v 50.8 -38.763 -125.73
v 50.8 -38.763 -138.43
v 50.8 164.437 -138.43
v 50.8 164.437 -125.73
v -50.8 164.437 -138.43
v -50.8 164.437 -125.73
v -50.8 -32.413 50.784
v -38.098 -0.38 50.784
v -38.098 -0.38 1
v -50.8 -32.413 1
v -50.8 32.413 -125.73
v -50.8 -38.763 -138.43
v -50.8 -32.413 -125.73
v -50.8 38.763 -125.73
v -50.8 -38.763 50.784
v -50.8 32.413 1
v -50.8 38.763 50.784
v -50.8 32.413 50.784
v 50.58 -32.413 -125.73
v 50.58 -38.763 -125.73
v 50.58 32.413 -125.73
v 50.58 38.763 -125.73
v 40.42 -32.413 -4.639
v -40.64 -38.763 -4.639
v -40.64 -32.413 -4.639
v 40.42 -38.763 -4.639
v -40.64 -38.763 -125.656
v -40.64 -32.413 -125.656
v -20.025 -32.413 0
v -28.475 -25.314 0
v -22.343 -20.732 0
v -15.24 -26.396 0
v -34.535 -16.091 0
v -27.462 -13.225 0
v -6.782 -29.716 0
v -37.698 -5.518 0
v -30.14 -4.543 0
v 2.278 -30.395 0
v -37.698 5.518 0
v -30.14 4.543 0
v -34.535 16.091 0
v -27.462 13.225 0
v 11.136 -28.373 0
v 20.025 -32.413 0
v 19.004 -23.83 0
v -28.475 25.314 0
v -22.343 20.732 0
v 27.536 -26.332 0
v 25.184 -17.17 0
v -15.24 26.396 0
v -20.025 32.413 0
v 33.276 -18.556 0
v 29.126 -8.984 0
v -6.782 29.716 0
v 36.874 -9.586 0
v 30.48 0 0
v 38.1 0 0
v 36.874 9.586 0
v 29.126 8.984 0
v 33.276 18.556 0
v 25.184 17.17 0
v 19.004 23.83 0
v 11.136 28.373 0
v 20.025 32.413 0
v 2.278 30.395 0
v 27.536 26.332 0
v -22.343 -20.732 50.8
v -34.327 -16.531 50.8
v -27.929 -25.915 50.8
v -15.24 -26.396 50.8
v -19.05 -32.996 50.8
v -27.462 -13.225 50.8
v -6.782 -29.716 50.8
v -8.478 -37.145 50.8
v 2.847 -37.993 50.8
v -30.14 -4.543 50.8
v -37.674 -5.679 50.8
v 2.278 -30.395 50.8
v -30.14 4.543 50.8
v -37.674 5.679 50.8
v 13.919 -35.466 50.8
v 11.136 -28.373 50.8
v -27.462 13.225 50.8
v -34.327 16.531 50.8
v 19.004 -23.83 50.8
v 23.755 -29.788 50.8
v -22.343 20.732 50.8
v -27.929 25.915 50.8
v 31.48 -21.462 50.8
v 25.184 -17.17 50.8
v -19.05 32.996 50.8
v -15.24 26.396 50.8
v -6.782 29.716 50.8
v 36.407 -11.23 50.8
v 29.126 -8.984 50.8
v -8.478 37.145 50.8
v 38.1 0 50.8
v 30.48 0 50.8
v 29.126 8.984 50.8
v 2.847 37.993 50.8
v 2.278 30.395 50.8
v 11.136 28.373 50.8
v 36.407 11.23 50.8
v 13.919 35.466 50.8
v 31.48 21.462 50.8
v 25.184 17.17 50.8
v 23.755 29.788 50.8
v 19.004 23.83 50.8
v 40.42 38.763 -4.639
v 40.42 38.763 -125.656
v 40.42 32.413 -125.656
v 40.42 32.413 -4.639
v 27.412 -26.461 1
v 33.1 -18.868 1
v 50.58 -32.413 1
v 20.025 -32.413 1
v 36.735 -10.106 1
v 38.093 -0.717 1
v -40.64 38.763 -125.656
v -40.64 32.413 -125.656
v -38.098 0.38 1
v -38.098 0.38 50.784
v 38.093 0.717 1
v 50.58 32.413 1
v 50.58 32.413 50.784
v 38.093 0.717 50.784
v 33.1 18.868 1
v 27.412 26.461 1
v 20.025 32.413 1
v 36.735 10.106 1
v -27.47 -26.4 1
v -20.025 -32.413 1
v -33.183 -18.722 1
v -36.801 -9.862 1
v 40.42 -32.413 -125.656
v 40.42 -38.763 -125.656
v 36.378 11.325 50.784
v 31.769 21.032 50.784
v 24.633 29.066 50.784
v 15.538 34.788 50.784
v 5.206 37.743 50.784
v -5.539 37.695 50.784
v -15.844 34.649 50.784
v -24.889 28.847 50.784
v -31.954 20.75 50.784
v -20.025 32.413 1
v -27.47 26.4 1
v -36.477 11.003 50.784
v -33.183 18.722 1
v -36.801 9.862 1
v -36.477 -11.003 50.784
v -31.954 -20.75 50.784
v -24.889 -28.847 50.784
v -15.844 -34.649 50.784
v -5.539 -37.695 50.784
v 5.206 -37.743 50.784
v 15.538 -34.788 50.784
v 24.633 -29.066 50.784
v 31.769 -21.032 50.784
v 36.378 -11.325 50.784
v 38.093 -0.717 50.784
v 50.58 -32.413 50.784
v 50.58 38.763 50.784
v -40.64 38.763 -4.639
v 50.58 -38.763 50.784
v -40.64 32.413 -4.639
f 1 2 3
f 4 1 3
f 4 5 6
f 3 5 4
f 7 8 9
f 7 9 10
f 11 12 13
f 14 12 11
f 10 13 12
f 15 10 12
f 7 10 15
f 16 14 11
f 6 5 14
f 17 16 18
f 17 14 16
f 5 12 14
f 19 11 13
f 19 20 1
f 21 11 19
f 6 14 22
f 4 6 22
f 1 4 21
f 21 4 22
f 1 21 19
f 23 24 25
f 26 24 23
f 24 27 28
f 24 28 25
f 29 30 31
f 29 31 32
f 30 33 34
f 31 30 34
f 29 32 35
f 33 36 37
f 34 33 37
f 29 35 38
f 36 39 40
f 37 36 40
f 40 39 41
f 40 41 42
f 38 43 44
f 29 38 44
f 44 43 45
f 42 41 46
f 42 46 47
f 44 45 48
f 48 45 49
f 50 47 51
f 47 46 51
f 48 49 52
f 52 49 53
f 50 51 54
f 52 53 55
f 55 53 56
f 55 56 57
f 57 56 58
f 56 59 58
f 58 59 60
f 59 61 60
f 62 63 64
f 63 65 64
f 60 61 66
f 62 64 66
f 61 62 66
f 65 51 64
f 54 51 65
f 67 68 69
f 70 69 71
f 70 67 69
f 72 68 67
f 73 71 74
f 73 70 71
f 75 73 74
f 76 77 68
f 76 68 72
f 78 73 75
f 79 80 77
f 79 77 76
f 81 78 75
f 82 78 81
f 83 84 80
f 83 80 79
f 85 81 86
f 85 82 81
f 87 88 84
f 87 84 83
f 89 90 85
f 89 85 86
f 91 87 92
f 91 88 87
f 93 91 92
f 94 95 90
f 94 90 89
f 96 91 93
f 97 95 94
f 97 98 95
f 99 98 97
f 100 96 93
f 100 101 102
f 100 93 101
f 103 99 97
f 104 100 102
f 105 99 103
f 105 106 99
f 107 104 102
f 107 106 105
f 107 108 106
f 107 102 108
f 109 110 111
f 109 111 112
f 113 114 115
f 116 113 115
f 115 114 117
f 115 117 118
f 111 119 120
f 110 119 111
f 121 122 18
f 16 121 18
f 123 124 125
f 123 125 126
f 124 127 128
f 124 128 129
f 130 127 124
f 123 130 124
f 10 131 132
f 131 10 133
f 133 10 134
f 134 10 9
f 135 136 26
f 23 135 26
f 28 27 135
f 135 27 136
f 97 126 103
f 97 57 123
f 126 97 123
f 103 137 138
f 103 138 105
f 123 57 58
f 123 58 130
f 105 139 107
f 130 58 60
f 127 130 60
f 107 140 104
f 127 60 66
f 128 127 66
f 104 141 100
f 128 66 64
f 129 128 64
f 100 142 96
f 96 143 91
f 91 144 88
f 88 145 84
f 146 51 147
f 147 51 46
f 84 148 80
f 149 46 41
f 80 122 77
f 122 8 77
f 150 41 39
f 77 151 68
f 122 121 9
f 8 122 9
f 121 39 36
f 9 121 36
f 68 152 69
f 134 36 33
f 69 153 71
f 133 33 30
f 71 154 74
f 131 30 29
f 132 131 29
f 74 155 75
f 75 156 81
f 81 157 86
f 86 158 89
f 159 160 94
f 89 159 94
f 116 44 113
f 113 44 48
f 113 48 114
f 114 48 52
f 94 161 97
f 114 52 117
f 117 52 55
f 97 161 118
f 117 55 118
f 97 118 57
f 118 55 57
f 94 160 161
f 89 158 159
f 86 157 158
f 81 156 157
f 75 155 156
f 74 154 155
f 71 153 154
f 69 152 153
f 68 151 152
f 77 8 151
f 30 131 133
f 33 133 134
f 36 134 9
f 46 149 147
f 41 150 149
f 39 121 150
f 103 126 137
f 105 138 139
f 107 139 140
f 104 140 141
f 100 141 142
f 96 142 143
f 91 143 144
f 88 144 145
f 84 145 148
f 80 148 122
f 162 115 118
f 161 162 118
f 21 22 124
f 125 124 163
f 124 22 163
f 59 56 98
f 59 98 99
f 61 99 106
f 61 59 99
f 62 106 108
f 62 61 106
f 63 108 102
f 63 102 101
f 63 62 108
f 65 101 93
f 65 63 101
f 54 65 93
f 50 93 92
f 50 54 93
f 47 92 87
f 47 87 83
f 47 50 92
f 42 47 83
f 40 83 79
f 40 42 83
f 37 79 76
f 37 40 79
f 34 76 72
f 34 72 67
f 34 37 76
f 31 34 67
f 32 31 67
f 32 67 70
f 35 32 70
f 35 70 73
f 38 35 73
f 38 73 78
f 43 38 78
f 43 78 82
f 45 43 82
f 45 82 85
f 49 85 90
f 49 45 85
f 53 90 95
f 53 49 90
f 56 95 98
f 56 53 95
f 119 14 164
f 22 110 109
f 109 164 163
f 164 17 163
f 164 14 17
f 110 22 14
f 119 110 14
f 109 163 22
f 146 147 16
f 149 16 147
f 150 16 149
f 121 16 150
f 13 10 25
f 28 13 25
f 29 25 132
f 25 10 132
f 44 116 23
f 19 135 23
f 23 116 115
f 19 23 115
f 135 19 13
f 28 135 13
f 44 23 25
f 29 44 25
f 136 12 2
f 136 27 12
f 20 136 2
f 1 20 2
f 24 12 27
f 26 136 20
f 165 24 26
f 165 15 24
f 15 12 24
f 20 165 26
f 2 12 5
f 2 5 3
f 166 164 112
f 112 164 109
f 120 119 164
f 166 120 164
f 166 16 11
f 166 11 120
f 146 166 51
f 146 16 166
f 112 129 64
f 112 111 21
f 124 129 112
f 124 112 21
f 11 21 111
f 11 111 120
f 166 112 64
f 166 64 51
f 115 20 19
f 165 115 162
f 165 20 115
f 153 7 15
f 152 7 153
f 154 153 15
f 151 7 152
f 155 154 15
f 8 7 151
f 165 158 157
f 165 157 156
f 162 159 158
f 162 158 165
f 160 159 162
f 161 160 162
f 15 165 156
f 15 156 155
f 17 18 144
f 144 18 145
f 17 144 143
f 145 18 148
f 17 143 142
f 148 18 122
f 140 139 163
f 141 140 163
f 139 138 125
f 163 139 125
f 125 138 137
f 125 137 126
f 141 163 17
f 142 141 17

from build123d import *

# Parameters (mm, degrees)
F0_R      = 38.1
F0_R_2    = 30.48
F1_DEPTH  = 50.8
F3_W      = 101.6
F3_H      = 203.2
F4_DEPTH  = 12.7
F5_W      = 101.3802451253
F5_H      = 189.2143650602
F6_DEPTH  = 6.35
F8_DEPTH  = 49.784
F9_W      = 81.0602451253
F9_H      = 121.0168540975
F10_DEPTH = 25.4


with BuildPart() as f1:
    # F0 (on Top) → F1 (new body)
    with BuildSketch(Plane.XY):
        Circle(F0_R)
        Circle(F0_R_2, mode=Mode.SUBTRACT)
    extrude(amount=F1_DEPTH)



with BuildPart() as f4:
    # F3 (on offset) → F4 (new body)
    with BuildSketch(Plane.XY.offset(-138.43)):
        with Locations((0, 62.8368258476)):
            Rectangle(F3_W, F3_H)
    extrude(amount=F4_DEPTH)


with BuildPart() as f6:
    # F5 (on face) → F6 (new body)
    with BuildSketch(Plane.XZ.offset(38.7631741524)):
        with Locations((-0.1098774374, -43.8228174699)):
            Rectangle(F5_W, F5_H)
    extrude(amount=-F6_DEPTH)


with BuildPart() as f1_1:
    add(f1.part)

    add(f6.part)  # F8 merges F6
    # F7 (on face) → F8 (join)
    with BuildSketch(Plane.XY.offset(50.7843650602)):
        with BuildLine():
            Line((-37.9473480204, 0), (-50.8, -32.4131741524))
            Line((-50.8, -32.4131741524), (-19.7329005255, -32.4131741524))
            ThreePointArc((-19.7329005255, -32.4131741524), (-33.081811207, -18.5901852881), (-37.9473480204, 0))
        make_face()
        with BuildLine():
            Line((19.7329005255, -32.4131741524), (50.5802451253, -32.4131741524))
            Line((50.5802451253, -32.4131741524), (37.945801456, -0.3425983667))
            ThreePointArc((37.945801456, -0.3425983667), (32.997554809, -18.7393329232), (19.7329005255, -32.4131741524))
        make_face()
    extrude(amount=-F8_DEPTH)

    # F9 (on face) → F10 (cut)
    with BuildSketch(Plane.XZ.offset(38.7631741524)):
        with Locations((-0.1098774374, -65.1476242347)):
            Rectangle(F9_W, F9_H)
    extrude(amount=-F10_DEPTH, mode=Mode.SUBTRACT)



with BuildPart() as f1_2:
    add(f1_1.part)

    add(f4.part)  # F11 merges F4
    # F11: F1 across plane
    add(f1_1.part.mirror(Plane.XZ))


solid = f1_2.part
